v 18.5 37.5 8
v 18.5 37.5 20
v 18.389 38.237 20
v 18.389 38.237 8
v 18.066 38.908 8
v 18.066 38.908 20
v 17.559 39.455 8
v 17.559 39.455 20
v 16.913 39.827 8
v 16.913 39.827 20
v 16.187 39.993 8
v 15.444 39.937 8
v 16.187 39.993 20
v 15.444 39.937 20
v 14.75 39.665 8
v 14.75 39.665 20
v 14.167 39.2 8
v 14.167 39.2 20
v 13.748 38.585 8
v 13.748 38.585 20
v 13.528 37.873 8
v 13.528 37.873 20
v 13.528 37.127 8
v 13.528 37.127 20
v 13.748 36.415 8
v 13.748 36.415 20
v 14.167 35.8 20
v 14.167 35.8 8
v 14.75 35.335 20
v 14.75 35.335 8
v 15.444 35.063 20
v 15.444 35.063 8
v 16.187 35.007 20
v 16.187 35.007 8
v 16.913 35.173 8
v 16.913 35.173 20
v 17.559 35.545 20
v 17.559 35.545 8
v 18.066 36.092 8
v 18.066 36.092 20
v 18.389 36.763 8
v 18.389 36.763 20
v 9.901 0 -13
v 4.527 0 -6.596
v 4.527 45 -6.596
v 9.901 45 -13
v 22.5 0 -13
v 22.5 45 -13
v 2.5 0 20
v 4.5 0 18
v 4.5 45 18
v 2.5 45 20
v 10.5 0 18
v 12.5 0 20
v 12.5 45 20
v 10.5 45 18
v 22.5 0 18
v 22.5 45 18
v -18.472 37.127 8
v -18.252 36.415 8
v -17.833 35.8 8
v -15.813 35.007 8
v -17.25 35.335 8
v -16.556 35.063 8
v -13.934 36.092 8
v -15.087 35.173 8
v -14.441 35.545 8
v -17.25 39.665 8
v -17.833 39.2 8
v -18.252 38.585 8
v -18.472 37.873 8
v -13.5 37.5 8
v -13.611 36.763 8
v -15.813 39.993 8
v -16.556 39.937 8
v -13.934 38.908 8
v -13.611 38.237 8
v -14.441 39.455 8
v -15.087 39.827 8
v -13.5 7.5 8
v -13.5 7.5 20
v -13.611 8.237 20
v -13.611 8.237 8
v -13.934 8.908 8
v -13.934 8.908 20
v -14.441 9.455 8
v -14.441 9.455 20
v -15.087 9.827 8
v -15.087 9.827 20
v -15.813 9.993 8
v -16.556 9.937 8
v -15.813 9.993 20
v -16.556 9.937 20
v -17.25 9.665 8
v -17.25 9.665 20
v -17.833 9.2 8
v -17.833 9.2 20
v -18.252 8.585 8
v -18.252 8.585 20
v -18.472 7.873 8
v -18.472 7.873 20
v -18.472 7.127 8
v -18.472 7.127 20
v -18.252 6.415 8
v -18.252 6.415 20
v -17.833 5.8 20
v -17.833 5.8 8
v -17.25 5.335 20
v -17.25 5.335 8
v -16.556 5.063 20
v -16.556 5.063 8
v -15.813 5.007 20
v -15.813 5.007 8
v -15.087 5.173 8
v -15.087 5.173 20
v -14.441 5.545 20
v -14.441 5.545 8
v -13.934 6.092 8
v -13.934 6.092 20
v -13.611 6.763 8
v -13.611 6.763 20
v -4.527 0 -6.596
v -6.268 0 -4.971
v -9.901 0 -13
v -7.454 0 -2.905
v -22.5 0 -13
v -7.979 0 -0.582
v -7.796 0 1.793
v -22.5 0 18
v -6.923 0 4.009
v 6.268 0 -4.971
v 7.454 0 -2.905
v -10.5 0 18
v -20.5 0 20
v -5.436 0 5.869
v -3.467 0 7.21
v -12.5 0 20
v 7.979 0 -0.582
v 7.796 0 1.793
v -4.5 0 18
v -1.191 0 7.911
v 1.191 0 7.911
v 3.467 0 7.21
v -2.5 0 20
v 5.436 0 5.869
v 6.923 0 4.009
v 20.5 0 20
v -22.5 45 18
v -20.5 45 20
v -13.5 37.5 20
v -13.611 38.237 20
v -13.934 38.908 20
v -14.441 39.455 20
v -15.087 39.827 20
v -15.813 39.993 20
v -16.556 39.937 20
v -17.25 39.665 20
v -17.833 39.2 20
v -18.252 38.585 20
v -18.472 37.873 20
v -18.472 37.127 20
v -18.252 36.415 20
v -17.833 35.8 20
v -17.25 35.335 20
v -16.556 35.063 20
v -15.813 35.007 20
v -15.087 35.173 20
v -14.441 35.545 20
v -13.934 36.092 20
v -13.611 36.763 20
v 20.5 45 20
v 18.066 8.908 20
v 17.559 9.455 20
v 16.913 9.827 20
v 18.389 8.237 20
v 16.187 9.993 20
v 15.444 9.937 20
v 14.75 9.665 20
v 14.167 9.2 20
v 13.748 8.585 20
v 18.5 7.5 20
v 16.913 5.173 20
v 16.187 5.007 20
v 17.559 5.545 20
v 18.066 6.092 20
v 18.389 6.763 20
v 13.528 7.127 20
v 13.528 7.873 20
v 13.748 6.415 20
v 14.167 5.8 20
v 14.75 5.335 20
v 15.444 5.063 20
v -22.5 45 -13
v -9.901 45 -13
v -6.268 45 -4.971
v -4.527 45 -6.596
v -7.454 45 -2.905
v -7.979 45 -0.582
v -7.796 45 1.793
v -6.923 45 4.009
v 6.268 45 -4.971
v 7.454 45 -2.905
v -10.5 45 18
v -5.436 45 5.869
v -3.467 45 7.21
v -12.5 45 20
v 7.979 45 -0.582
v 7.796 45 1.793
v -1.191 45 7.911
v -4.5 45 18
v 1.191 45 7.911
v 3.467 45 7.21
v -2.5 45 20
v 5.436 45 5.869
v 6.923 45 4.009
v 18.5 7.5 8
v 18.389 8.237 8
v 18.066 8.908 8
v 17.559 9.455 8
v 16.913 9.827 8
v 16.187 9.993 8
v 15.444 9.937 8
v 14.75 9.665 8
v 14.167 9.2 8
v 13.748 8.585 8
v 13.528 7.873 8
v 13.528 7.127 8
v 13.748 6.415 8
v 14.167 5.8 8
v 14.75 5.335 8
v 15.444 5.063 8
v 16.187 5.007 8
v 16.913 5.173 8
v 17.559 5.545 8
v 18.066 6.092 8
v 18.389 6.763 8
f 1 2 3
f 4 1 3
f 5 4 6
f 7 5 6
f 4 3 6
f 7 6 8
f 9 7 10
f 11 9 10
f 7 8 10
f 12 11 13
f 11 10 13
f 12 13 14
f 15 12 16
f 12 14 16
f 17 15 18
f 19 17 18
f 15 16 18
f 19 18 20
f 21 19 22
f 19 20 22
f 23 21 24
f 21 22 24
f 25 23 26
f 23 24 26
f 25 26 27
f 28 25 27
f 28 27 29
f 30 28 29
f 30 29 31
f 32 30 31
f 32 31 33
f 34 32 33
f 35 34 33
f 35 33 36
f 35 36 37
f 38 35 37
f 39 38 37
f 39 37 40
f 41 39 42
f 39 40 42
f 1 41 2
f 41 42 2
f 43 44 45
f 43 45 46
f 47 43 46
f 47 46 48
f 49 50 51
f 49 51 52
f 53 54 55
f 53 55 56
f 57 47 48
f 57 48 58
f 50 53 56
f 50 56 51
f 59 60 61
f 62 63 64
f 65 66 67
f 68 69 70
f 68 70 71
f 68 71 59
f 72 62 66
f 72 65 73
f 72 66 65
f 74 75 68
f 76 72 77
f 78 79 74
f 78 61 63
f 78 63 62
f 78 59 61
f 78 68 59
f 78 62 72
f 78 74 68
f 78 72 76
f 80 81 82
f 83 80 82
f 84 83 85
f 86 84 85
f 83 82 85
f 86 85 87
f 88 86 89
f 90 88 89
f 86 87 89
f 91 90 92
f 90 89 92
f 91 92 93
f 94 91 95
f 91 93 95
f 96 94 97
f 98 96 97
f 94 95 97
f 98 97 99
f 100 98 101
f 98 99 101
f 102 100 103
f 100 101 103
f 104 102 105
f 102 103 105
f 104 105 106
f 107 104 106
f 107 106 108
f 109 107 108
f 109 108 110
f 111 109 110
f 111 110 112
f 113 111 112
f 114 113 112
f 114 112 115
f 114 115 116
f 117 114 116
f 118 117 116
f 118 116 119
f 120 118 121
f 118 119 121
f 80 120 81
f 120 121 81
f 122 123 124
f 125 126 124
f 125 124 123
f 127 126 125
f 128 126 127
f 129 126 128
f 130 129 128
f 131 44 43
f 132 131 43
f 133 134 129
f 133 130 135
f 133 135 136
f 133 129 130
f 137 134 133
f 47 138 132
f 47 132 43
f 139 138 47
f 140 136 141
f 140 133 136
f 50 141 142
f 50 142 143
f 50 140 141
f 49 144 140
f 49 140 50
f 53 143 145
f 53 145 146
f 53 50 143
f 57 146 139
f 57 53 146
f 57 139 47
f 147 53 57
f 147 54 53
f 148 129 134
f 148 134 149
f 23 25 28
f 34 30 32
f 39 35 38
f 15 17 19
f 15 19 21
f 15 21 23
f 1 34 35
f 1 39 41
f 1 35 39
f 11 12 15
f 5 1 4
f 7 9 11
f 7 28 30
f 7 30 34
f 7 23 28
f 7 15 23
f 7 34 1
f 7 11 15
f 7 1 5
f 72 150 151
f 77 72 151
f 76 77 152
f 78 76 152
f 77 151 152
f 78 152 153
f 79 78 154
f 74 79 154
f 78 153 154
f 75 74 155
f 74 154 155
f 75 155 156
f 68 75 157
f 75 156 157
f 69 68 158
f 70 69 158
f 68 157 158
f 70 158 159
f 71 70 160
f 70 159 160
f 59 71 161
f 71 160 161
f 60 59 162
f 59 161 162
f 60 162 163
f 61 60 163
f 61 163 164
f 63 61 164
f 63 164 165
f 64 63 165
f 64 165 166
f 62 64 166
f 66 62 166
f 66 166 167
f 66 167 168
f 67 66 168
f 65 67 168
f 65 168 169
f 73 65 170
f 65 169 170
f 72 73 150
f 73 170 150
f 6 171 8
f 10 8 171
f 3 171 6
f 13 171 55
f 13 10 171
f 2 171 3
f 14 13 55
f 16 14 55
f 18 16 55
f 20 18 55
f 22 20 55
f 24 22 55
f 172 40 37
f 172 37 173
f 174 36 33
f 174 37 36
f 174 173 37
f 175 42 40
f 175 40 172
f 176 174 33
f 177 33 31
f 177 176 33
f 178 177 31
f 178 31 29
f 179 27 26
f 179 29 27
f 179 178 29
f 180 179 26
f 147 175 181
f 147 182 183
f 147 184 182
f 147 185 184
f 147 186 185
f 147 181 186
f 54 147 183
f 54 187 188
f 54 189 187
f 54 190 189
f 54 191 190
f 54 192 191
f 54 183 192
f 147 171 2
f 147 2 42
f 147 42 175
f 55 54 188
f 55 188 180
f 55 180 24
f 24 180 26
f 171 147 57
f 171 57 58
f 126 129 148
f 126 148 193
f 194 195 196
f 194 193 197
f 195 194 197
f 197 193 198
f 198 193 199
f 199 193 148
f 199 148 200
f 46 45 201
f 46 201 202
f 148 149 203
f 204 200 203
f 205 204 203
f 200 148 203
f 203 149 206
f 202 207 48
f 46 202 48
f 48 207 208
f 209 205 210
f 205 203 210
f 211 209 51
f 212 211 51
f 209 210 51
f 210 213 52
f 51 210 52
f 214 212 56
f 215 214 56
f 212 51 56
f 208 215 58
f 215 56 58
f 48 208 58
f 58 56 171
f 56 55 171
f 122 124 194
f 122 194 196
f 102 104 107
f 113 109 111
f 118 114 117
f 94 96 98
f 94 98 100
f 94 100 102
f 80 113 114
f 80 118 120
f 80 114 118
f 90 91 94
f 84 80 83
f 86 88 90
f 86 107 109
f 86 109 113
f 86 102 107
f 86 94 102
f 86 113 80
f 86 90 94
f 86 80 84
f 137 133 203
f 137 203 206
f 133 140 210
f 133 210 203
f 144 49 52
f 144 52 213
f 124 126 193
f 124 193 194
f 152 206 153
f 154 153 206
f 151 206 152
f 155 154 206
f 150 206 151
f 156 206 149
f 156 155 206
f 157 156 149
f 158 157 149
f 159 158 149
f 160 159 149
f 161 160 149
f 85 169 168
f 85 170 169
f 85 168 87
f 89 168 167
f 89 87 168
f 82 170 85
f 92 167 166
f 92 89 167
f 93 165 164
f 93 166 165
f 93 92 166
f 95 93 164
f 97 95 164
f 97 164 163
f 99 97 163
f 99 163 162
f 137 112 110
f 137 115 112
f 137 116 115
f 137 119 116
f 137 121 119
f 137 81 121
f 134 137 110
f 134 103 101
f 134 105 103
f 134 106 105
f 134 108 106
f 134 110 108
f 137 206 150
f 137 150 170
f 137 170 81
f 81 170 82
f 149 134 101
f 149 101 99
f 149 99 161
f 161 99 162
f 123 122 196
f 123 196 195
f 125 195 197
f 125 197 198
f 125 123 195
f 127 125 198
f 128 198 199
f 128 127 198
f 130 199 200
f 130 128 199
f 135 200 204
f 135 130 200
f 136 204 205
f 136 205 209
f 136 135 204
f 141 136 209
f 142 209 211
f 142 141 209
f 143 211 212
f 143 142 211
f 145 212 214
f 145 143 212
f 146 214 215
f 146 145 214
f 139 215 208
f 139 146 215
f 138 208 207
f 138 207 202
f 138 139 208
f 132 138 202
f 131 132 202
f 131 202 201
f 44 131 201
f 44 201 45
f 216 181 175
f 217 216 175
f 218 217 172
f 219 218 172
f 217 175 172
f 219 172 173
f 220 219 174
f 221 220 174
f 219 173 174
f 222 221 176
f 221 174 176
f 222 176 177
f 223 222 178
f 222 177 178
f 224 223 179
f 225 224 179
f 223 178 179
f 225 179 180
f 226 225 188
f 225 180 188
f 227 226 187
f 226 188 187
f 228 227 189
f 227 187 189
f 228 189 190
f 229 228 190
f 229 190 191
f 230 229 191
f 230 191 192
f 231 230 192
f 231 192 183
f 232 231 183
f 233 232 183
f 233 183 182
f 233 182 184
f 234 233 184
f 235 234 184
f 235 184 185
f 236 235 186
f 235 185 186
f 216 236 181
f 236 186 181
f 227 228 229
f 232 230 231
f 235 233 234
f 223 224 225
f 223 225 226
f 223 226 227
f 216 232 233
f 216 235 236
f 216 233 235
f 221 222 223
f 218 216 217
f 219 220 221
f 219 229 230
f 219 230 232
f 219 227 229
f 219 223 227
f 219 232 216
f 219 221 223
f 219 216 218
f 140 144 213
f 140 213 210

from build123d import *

# Parameters (mm, degrees)
F1_DEPTH = 45
F3_SIZE  = 2
F2_R     = 2.5
F4_DEPTH = 12


with BuildPart() as f1:
    # F0 (on Front) → F1 (new body)
    with BuildSketch(Plane.XZ):
        with BuildLine():
            ThreePointArc((-4.526972, -6.595947), (0, 8), (4.526972, -6.595947))
            Line((4.526972, -6.595947), (9.900611, -13))
            Line((9.900611, -13), (22.5, -13))
            Line((22.5, -13), (22.5, 20))
            Line((22.5, 20), (12.5, 20))
            Line((12.5, 20), (10.5, 18))
            Line((10.5, 18), (4.5, 18))
            Line((4.5, 18), (2.5, 20))
            Line((2.5, 20), (0, 20))
            Line((0, 20), (-2.5, 20))
            Line((-2.5, 20), (-4.5, 18))
            Line((-4.5, 18), (-10.5, 18))
            Line((-10.5, 18), (-12.5, 20))
            Line((-12.5, 20), (-22.5, 20))
            Line((-22.5, 20), (-22.5, -13))
            Line((-22.5, -13), (-9.900611, -13))
            Line((-9.900611, -13), (-4.526972, -6.595947))
        make_face()
    extrude(amount=-F1_DEPTH)

    # F3
    f3_edges = [f1.edges().sort_by_distance(p)[0] for p in [
        (22.5, 22.5, 20),
        (-22.5, 22.5, 20),
    ]]
    chamfer(f3_edges, length=F3_SIZE)

    # F2 (on face) → F4 (cut)
    with BuildSketch(Plane.XY.offset(20)):
        with Locations((-16, 37.5)):
            Circle(F2_R)
        with Locations((-16, 7.5)):
            Circle(F2_R)
        with Locations((16, 37.5)):
            Circle(F2_R)
        with Locations((16, 7.5)):
            Circle(F2_R)
    extrude(amount=-F4_DEPTH, mode=Mode.SUBTRACT)


solid = f1.part
